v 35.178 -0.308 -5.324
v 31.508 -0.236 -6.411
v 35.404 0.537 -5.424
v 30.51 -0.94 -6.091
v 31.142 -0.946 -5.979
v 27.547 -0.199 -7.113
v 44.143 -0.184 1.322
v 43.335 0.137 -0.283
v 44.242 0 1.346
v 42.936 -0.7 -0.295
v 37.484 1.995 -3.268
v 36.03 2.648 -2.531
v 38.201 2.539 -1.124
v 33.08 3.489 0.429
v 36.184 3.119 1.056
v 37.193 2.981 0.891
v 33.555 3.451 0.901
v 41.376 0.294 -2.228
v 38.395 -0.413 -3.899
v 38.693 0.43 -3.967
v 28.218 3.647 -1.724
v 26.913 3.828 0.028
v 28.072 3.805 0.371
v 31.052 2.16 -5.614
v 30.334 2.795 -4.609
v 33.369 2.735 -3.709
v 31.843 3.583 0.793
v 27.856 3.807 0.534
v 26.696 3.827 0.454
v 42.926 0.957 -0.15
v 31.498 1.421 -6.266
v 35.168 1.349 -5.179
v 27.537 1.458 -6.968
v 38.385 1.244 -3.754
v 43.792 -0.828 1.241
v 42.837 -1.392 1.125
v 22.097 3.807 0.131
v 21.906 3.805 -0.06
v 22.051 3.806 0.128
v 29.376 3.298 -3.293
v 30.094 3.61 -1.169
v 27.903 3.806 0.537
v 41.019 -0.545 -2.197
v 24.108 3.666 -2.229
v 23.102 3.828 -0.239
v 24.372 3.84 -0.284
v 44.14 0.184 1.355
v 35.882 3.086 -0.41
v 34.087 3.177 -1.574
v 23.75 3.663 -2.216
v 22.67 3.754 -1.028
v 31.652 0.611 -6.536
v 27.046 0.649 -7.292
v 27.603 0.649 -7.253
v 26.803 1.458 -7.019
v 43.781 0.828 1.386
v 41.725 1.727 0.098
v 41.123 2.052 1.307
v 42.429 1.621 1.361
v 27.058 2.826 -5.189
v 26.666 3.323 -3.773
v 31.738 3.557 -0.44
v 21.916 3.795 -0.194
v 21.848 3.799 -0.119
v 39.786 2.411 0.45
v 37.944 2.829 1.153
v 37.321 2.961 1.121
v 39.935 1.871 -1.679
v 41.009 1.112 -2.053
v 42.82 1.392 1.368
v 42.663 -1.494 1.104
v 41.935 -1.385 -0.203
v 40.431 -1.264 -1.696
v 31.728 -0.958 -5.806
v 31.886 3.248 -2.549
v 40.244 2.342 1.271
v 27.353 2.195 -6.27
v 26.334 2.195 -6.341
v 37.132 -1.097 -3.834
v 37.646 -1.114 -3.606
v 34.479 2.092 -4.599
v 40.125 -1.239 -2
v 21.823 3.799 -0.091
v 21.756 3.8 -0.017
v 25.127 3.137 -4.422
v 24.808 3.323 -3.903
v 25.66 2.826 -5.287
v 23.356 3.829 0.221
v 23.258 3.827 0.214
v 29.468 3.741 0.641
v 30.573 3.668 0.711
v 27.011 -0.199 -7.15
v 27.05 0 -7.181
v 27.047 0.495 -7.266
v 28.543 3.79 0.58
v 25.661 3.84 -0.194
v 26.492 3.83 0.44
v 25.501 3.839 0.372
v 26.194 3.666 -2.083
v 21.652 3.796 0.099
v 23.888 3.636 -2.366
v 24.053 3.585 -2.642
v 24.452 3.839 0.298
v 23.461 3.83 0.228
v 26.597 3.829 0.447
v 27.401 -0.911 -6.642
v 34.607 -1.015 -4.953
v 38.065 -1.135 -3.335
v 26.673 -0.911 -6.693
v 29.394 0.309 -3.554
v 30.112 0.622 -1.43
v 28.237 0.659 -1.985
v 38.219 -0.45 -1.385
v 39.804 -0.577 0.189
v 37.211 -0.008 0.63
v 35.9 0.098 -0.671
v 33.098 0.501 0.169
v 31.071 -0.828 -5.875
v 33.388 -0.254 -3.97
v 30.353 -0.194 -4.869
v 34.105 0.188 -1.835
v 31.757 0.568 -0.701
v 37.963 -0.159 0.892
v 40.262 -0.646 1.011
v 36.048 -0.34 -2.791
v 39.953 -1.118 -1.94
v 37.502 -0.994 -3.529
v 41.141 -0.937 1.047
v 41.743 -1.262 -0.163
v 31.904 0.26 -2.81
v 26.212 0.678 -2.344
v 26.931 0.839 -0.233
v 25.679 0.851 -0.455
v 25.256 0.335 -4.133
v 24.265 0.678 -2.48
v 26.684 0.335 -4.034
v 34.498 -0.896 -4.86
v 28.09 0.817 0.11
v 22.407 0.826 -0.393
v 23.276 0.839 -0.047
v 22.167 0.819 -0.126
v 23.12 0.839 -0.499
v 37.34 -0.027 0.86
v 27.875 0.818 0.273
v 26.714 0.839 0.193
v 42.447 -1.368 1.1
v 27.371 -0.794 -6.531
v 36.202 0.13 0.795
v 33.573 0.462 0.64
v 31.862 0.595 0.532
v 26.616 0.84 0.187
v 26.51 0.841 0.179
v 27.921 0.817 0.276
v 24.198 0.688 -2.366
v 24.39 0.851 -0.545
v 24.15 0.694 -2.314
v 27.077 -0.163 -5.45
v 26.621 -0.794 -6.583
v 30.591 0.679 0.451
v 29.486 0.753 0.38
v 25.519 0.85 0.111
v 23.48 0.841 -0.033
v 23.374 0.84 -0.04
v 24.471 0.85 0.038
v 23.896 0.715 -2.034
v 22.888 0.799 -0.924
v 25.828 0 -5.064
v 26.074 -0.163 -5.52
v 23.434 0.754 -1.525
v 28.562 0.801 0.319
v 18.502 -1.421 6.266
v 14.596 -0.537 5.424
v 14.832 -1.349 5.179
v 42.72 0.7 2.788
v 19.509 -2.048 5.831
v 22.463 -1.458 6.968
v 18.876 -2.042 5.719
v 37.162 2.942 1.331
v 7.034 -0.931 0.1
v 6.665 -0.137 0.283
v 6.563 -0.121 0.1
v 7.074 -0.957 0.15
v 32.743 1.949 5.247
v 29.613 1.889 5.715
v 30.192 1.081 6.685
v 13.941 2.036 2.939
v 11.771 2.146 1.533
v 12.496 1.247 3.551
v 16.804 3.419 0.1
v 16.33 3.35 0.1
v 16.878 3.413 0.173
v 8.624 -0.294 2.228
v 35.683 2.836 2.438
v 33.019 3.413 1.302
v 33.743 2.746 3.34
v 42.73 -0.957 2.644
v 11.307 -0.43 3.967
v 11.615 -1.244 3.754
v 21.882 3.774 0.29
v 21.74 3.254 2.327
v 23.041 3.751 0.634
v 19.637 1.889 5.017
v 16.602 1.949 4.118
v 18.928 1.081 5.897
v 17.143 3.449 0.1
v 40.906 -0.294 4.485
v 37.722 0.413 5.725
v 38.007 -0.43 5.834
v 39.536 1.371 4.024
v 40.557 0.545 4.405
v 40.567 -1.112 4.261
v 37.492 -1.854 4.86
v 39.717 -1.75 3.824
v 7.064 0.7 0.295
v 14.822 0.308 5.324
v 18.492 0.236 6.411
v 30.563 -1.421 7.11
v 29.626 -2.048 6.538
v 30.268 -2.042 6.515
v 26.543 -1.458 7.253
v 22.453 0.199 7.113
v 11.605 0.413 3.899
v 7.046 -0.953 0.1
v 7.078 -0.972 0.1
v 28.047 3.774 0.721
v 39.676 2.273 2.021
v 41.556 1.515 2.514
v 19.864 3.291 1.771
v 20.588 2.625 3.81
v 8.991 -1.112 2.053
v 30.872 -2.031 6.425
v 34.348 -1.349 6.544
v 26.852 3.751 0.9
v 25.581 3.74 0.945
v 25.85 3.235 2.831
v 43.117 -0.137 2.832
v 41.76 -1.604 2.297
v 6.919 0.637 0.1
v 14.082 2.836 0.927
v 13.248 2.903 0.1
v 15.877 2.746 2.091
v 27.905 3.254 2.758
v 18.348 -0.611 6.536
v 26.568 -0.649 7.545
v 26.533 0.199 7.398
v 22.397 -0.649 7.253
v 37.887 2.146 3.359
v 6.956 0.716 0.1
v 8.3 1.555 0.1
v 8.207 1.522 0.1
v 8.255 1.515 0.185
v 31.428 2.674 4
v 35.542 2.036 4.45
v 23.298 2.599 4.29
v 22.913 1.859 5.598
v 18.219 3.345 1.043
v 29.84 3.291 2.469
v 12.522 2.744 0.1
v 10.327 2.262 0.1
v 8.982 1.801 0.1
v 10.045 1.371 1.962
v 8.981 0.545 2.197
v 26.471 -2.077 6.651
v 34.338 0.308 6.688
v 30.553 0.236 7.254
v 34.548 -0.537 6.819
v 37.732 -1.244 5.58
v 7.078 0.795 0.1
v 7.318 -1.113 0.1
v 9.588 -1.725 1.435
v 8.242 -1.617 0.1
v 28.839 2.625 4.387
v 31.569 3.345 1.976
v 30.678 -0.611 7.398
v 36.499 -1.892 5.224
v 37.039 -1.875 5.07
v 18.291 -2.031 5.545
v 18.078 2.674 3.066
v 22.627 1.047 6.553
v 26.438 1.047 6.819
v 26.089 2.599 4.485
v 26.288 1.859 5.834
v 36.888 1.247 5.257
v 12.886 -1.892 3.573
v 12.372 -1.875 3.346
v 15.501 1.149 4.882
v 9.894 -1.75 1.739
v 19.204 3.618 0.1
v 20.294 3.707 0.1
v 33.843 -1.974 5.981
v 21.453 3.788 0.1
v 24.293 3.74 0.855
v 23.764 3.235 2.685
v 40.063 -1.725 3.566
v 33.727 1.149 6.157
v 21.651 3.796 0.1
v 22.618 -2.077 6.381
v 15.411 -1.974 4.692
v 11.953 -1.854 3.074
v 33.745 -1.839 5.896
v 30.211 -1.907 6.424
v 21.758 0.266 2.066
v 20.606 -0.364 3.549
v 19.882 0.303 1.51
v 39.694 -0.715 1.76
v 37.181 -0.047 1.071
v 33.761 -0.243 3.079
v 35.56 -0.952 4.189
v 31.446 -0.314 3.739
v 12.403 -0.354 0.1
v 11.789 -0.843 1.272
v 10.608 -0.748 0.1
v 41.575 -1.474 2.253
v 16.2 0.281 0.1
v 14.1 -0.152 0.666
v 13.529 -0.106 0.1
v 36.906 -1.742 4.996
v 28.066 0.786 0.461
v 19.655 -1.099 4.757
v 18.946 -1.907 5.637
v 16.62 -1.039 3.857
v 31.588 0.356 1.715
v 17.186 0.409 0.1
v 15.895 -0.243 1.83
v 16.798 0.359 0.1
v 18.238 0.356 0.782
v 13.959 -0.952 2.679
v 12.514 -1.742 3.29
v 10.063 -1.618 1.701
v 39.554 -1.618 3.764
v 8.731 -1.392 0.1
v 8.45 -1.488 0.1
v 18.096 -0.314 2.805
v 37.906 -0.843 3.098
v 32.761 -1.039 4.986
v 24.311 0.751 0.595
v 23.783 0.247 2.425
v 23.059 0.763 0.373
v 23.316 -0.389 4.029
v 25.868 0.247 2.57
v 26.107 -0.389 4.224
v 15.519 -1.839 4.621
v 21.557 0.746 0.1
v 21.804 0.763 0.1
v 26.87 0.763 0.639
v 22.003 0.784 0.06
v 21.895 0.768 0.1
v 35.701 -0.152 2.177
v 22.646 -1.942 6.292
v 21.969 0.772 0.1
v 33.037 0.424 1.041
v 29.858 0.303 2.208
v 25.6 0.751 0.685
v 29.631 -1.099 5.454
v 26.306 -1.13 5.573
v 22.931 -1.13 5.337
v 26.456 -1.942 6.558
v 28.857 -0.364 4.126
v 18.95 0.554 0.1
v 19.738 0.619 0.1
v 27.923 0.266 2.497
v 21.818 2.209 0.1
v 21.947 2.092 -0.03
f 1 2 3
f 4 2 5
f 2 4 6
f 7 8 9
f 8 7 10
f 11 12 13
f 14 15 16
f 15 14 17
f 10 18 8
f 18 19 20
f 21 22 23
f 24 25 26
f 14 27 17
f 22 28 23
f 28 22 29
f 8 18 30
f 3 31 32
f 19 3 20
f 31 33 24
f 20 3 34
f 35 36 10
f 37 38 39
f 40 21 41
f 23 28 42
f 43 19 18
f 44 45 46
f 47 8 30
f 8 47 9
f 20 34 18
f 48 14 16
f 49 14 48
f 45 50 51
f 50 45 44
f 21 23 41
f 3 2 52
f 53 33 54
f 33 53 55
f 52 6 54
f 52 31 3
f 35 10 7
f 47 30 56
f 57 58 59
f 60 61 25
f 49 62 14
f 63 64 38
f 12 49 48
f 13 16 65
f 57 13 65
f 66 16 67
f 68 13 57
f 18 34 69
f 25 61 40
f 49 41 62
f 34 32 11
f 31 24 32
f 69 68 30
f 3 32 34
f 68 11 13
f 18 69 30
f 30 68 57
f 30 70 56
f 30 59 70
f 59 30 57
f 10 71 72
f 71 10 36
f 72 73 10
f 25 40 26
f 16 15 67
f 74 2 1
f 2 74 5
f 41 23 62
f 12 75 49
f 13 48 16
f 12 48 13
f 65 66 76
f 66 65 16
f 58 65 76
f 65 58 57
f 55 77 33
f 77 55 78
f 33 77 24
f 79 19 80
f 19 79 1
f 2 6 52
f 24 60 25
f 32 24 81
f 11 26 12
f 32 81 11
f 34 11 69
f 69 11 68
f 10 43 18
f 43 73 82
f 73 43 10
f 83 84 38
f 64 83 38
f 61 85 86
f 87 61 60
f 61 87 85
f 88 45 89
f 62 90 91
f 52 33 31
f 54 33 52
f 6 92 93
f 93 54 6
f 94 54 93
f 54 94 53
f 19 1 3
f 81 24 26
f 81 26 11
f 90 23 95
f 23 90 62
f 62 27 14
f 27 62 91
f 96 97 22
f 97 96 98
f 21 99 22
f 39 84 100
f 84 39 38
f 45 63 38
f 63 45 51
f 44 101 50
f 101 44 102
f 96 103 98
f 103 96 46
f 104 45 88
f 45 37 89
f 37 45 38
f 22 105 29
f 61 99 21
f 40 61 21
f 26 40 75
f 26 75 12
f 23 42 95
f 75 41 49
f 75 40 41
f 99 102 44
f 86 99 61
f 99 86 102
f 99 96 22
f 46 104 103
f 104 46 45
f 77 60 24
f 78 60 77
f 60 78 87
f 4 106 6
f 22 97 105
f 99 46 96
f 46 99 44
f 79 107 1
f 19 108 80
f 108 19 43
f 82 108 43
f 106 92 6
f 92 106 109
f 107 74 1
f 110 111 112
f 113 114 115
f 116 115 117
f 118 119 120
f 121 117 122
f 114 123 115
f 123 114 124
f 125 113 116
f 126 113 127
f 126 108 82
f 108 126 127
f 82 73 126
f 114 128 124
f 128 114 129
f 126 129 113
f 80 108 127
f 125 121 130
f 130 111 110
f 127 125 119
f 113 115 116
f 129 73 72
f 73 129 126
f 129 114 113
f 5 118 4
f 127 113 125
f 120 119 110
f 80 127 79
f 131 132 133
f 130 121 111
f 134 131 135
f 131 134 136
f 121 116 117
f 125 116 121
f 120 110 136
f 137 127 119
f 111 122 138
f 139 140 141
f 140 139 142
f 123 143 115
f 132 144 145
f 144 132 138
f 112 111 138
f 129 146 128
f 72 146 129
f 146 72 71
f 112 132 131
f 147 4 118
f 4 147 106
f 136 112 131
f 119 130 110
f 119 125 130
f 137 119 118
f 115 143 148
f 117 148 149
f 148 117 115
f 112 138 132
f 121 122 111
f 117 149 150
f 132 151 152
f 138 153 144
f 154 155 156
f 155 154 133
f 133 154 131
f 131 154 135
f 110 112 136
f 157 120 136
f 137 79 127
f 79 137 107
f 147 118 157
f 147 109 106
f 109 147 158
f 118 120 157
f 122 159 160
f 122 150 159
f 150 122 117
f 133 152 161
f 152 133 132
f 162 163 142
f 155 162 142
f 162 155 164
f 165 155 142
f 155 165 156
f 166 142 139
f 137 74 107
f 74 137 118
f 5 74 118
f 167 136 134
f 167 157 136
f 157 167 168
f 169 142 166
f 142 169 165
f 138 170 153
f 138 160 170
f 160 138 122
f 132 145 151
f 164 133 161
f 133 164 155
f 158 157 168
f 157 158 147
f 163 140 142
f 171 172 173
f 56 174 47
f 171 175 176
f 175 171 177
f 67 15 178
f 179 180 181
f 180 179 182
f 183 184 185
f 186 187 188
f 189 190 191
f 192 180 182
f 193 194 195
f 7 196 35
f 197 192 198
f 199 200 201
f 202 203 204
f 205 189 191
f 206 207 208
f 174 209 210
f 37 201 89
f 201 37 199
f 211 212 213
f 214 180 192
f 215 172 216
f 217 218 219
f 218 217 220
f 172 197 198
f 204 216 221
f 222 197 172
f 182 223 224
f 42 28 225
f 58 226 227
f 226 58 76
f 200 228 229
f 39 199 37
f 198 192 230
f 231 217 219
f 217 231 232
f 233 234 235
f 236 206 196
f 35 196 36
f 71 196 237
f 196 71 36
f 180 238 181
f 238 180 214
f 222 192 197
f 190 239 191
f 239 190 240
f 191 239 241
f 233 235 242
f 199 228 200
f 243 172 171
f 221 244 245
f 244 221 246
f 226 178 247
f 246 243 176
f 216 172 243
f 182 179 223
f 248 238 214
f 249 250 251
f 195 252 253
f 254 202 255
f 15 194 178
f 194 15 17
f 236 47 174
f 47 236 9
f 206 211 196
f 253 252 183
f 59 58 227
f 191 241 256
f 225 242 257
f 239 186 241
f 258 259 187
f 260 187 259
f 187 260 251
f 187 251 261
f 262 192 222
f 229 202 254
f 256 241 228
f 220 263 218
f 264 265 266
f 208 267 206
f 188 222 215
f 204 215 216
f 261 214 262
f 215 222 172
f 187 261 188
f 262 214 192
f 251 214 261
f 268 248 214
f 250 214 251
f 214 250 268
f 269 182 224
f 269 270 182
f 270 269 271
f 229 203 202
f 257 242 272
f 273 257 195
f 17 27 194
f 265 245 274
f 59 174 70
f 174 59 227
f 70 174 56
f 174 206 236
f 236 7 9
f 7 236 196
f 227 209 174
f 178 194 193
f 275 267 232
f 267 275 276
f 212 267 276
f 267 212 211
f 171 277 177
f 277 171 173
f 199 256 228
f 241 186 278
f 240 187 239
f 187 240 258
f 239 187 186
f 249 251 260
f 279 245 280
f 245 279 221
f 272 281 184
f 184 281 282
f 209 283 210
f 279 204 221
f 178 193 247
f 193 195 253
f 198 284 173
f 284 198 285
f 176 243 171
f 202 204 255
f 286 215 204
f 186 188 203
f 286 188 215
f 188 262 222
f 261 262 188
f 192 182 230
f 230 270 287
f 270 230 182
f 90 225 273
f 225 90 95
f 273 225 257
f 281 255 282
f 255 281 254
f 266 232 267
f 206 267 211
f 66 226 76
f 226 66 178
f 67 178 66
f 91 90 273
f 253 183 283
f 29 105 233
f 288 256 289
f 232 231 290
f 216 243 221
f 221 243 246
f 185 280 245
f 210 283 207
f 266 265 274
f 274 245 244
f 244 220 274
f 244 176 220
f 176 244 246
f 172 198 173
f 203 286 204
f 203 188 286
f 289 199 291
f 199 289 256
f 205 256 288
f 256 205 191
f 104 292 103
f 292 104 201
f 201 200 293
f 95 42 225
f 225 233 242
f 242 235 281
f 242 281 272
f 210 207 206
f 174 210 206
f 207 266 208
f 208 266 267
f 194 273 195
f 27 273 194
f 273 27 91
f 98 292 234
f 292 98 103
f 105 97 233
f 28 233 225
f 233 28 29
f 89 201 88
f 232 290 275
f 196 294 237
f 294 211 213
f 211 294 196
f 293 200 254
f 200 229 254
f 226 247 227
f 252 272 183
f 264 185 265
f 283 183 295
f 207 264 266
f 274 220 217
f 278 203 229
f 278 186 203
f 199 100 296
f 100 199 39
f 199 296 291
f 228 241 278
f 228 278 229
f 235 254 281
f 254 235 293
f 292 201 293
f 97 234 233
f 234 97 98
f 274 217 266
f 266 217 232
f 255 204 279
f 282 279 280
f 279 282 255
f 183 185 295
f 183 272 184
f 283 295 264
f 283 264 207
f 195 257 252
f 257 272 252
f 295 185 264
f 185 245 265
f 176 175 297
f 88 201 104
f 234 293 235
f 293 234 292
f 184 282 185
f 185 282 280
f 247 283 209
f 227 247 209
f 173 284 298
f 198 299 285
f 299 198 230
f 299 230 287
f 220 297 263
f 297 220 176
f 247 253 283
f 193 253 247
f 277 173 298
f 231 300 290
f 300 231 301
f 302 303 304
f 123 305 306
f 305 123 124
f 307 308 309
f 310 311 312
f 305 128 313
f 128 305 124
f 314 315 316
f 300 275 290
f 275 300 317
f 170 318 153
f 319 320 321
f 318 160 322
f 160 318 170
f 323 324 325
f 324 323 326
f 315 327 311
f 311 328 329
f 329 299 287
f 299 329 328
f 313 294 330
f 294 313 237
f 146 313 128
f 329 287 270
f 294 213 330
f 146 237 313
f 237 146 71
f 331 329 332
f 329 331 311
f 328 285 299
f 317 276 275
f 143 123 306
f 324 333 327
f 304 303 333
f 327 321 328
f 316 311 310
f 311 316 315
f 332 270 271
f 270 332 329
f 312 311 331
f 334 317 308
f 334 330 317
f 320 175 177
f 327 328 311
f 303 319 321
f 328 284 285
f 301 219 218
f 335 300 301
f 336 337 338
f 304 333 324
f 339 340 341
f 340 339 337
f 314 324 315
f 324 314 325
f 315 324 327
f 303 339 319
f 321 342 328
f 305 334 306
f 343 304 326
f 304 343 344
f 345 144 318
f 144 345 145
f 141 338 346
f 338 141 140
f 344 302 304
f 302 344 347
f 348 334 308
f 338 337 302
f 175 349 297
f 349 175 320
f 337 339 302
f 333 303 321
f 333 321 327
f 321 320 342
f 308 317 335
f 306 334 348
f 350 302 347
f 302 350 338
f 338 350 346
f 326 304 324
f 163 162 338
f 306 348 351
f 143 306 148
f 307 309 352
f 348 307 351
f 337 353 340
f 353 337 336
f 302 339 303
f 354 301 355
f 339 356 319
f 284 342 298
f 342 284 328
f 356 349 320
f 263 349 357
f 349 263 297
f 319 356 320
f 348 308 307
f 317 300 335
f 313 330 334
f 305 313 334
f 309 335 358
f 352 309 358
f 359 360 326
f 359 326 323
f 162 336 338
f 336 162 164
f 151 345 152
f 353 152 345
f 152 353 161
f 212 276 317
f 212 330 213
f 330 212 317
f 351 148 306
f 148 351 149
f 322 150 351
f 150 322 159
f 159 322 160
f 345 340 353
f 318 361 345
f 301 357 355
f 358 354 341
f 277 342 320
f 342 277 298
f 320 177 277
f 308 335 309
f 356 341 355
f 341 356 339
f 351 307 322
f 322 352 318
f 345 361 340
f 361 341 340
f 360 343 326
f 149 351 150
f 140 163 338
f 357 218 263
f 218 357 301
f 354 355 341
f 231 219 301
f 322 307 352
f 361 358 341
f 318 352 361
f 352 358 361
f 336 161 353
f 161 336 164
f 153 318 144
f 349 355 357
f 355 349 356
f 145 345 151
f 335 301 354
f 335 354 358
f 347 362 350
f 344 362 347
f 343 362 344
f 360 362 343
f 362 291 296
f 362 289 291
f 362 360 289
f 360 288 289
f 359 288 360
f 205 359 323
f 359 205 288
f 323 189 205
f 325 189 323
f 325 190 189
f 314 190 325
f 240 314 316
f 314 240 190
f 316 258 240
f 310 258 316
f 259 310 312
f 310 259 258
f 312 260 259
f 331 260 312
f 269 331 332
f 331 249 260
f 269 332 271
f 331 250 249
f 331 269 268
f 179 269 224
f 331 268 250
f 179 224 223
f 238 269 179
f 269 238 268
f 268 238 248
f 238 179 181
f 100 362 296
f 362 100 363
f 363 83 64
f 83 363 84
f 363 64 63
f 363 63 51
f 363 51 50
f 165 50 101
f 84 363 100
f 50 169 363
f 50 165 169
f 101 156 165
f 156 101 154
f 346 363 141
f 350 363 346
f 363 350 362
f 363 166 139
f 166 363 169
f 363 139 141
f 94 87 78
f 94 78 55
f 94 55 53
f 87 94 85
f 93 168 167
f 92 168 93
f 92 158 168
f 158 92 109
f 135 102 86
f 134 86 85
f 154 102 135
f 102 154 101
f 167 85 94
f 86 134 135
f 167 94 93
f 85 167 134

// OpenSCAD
difference(){
    //ear();
    //translate([0,0,-1]) cylinder(h=3,d=25);
}
difference(){
    translate([25,0,0])
    rotate([95,-4,0])
    //minkowski(){
        cat_ear();
    //    sphere(2);
    //}
    
    intersection(){
        #translate([0,-25,-50+0.1]) cube(50);
        #translate([0,0,-20]) sphere(30);
    }
    
    //translate([0,-25,0.5]) cube(50);
}
module cat_ear(){
    half_cat_ear();
    rotate([0,0,180]) half_cat_ear();
}

module half_cat_ear(){
    scale([1,0.5,0.2])
    translate([0,5,0])
    difference(){
        sphere(20);
        translate([0,0,15]) sphere(20);
        translate([-20,-5,-20])cube(40);
    }
}

module ear(){
    
    $fn=150;
    sphere_size=200;
    intersection(){
        cylinder(h=0.5,d1=36,d2=34);
        //translate([0,0,-sphere_size+1])
        //rotate([45,45,0])
        //sphere(sphere_size);
    }
    translate([0,0,-0.5])cylinder(h=0.5,d1=35,d2=36);
    
    difference(){
        translate([0,0,-0.5])cylinder(h=0.5,d1=36,d2=36);
        #translate([20,7,-1])
        rotate([0,0,360/6])cube([50,50,50]);
    }

    translate([-36/2+1.6,0,-1])cube([0.8,4,1], true);
    translate([-36/2+1.5,0,-2])cube([1,4,1], true);

    rotate([0,0,360/3]){
        translate([-36/2+1.6,0,-1])cube([0.8,4,1], true);
        translate([-36/2+1.5,0,-2])cube([1,4,1], true);
    }

    rotate([0,0,360/6]){
        translate([-36/2+3,0,-1.5])cube([3,0.7,2], true);
    }

    rotate([0,0,360/6+180]){
        translate([-36/2+1,0,-1.5])cube([1,5,2], true);
        translate([-36/2+1,0,-3.5])cube([1,3,2], true);
        translate([-36/2+0.7,0,-4.25])cube([1.2,3,0.5], true);
        
    }
}
